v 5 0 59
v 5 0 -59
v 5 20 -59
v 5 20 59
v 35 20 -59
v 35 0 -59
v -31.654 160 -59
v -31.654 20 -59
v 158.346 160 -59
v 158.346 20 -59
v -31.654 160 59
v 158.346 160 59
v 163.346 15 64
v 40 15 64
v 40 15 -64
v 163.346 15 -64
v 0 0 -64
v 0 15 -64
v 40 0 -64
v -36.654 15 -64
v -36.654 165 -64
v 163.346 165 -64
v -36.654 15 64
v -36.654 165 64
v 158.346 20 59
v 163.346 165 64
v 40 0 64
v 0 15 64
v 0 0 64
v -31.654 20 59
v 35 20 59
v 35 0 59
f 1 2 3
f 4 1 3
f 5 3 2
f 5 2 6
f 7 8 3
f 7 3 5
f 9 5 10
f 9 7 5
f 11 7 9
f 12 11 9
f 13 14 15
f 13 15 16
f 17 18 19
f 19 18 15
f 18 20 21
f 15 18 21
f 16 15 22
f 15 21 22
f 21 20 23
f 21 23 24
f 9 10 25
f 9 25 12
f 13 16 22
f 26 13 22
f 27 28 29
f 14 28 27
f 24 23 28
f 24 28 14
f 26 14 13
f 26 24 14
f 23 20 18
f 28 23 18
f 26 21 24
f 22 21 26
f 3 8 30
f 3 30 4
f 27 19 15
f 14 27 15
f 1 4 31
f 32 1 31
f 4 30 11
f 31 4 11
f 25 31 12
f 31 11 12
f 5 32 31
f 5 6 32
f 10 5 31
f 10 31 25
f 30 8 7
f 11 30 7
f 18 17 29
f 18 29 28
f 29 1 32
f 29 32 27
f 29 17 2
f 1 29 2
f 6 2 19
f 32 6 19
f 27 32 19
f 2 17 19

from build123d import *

# Parameters (mm, degrees)
BOSS_EXTRUDE1_DEPTH      = 64
BOSS_EXTRUDE1_DEPTH_BACK = 64
SHELL1_T                 = -5


with BuildPart() as part:
    # Sketch1 → Boss-Extrude1 (new, two sides: drawn at the far end of the back side and taken through both)
    with BuildSketch(Plane.XY.offset(-BOSS_EXTRUDE1_DEPTH_BACK)):
        Polygon((0, 15), (0, 0), (40, 0), (40, 15), (163.345771361, 15), (163.345771361, 165), (-36.654228639, 165), (-36.654228639, 15), align=None)
    extrude(amount=BOSS_EXTRUDE1_DEPTH + BOSS_EXTRUDE1_DEPTH_BACK)

    # Shell1
    shell1_openings = [part.faces().sort_by_distance(p)[0] for p in [
        (20, 0, 0),
    ]]
    offset(amount=SHELL1_T, openings=shell1_openings, kind=Kind.INTERSECTION)


solid = part.part
